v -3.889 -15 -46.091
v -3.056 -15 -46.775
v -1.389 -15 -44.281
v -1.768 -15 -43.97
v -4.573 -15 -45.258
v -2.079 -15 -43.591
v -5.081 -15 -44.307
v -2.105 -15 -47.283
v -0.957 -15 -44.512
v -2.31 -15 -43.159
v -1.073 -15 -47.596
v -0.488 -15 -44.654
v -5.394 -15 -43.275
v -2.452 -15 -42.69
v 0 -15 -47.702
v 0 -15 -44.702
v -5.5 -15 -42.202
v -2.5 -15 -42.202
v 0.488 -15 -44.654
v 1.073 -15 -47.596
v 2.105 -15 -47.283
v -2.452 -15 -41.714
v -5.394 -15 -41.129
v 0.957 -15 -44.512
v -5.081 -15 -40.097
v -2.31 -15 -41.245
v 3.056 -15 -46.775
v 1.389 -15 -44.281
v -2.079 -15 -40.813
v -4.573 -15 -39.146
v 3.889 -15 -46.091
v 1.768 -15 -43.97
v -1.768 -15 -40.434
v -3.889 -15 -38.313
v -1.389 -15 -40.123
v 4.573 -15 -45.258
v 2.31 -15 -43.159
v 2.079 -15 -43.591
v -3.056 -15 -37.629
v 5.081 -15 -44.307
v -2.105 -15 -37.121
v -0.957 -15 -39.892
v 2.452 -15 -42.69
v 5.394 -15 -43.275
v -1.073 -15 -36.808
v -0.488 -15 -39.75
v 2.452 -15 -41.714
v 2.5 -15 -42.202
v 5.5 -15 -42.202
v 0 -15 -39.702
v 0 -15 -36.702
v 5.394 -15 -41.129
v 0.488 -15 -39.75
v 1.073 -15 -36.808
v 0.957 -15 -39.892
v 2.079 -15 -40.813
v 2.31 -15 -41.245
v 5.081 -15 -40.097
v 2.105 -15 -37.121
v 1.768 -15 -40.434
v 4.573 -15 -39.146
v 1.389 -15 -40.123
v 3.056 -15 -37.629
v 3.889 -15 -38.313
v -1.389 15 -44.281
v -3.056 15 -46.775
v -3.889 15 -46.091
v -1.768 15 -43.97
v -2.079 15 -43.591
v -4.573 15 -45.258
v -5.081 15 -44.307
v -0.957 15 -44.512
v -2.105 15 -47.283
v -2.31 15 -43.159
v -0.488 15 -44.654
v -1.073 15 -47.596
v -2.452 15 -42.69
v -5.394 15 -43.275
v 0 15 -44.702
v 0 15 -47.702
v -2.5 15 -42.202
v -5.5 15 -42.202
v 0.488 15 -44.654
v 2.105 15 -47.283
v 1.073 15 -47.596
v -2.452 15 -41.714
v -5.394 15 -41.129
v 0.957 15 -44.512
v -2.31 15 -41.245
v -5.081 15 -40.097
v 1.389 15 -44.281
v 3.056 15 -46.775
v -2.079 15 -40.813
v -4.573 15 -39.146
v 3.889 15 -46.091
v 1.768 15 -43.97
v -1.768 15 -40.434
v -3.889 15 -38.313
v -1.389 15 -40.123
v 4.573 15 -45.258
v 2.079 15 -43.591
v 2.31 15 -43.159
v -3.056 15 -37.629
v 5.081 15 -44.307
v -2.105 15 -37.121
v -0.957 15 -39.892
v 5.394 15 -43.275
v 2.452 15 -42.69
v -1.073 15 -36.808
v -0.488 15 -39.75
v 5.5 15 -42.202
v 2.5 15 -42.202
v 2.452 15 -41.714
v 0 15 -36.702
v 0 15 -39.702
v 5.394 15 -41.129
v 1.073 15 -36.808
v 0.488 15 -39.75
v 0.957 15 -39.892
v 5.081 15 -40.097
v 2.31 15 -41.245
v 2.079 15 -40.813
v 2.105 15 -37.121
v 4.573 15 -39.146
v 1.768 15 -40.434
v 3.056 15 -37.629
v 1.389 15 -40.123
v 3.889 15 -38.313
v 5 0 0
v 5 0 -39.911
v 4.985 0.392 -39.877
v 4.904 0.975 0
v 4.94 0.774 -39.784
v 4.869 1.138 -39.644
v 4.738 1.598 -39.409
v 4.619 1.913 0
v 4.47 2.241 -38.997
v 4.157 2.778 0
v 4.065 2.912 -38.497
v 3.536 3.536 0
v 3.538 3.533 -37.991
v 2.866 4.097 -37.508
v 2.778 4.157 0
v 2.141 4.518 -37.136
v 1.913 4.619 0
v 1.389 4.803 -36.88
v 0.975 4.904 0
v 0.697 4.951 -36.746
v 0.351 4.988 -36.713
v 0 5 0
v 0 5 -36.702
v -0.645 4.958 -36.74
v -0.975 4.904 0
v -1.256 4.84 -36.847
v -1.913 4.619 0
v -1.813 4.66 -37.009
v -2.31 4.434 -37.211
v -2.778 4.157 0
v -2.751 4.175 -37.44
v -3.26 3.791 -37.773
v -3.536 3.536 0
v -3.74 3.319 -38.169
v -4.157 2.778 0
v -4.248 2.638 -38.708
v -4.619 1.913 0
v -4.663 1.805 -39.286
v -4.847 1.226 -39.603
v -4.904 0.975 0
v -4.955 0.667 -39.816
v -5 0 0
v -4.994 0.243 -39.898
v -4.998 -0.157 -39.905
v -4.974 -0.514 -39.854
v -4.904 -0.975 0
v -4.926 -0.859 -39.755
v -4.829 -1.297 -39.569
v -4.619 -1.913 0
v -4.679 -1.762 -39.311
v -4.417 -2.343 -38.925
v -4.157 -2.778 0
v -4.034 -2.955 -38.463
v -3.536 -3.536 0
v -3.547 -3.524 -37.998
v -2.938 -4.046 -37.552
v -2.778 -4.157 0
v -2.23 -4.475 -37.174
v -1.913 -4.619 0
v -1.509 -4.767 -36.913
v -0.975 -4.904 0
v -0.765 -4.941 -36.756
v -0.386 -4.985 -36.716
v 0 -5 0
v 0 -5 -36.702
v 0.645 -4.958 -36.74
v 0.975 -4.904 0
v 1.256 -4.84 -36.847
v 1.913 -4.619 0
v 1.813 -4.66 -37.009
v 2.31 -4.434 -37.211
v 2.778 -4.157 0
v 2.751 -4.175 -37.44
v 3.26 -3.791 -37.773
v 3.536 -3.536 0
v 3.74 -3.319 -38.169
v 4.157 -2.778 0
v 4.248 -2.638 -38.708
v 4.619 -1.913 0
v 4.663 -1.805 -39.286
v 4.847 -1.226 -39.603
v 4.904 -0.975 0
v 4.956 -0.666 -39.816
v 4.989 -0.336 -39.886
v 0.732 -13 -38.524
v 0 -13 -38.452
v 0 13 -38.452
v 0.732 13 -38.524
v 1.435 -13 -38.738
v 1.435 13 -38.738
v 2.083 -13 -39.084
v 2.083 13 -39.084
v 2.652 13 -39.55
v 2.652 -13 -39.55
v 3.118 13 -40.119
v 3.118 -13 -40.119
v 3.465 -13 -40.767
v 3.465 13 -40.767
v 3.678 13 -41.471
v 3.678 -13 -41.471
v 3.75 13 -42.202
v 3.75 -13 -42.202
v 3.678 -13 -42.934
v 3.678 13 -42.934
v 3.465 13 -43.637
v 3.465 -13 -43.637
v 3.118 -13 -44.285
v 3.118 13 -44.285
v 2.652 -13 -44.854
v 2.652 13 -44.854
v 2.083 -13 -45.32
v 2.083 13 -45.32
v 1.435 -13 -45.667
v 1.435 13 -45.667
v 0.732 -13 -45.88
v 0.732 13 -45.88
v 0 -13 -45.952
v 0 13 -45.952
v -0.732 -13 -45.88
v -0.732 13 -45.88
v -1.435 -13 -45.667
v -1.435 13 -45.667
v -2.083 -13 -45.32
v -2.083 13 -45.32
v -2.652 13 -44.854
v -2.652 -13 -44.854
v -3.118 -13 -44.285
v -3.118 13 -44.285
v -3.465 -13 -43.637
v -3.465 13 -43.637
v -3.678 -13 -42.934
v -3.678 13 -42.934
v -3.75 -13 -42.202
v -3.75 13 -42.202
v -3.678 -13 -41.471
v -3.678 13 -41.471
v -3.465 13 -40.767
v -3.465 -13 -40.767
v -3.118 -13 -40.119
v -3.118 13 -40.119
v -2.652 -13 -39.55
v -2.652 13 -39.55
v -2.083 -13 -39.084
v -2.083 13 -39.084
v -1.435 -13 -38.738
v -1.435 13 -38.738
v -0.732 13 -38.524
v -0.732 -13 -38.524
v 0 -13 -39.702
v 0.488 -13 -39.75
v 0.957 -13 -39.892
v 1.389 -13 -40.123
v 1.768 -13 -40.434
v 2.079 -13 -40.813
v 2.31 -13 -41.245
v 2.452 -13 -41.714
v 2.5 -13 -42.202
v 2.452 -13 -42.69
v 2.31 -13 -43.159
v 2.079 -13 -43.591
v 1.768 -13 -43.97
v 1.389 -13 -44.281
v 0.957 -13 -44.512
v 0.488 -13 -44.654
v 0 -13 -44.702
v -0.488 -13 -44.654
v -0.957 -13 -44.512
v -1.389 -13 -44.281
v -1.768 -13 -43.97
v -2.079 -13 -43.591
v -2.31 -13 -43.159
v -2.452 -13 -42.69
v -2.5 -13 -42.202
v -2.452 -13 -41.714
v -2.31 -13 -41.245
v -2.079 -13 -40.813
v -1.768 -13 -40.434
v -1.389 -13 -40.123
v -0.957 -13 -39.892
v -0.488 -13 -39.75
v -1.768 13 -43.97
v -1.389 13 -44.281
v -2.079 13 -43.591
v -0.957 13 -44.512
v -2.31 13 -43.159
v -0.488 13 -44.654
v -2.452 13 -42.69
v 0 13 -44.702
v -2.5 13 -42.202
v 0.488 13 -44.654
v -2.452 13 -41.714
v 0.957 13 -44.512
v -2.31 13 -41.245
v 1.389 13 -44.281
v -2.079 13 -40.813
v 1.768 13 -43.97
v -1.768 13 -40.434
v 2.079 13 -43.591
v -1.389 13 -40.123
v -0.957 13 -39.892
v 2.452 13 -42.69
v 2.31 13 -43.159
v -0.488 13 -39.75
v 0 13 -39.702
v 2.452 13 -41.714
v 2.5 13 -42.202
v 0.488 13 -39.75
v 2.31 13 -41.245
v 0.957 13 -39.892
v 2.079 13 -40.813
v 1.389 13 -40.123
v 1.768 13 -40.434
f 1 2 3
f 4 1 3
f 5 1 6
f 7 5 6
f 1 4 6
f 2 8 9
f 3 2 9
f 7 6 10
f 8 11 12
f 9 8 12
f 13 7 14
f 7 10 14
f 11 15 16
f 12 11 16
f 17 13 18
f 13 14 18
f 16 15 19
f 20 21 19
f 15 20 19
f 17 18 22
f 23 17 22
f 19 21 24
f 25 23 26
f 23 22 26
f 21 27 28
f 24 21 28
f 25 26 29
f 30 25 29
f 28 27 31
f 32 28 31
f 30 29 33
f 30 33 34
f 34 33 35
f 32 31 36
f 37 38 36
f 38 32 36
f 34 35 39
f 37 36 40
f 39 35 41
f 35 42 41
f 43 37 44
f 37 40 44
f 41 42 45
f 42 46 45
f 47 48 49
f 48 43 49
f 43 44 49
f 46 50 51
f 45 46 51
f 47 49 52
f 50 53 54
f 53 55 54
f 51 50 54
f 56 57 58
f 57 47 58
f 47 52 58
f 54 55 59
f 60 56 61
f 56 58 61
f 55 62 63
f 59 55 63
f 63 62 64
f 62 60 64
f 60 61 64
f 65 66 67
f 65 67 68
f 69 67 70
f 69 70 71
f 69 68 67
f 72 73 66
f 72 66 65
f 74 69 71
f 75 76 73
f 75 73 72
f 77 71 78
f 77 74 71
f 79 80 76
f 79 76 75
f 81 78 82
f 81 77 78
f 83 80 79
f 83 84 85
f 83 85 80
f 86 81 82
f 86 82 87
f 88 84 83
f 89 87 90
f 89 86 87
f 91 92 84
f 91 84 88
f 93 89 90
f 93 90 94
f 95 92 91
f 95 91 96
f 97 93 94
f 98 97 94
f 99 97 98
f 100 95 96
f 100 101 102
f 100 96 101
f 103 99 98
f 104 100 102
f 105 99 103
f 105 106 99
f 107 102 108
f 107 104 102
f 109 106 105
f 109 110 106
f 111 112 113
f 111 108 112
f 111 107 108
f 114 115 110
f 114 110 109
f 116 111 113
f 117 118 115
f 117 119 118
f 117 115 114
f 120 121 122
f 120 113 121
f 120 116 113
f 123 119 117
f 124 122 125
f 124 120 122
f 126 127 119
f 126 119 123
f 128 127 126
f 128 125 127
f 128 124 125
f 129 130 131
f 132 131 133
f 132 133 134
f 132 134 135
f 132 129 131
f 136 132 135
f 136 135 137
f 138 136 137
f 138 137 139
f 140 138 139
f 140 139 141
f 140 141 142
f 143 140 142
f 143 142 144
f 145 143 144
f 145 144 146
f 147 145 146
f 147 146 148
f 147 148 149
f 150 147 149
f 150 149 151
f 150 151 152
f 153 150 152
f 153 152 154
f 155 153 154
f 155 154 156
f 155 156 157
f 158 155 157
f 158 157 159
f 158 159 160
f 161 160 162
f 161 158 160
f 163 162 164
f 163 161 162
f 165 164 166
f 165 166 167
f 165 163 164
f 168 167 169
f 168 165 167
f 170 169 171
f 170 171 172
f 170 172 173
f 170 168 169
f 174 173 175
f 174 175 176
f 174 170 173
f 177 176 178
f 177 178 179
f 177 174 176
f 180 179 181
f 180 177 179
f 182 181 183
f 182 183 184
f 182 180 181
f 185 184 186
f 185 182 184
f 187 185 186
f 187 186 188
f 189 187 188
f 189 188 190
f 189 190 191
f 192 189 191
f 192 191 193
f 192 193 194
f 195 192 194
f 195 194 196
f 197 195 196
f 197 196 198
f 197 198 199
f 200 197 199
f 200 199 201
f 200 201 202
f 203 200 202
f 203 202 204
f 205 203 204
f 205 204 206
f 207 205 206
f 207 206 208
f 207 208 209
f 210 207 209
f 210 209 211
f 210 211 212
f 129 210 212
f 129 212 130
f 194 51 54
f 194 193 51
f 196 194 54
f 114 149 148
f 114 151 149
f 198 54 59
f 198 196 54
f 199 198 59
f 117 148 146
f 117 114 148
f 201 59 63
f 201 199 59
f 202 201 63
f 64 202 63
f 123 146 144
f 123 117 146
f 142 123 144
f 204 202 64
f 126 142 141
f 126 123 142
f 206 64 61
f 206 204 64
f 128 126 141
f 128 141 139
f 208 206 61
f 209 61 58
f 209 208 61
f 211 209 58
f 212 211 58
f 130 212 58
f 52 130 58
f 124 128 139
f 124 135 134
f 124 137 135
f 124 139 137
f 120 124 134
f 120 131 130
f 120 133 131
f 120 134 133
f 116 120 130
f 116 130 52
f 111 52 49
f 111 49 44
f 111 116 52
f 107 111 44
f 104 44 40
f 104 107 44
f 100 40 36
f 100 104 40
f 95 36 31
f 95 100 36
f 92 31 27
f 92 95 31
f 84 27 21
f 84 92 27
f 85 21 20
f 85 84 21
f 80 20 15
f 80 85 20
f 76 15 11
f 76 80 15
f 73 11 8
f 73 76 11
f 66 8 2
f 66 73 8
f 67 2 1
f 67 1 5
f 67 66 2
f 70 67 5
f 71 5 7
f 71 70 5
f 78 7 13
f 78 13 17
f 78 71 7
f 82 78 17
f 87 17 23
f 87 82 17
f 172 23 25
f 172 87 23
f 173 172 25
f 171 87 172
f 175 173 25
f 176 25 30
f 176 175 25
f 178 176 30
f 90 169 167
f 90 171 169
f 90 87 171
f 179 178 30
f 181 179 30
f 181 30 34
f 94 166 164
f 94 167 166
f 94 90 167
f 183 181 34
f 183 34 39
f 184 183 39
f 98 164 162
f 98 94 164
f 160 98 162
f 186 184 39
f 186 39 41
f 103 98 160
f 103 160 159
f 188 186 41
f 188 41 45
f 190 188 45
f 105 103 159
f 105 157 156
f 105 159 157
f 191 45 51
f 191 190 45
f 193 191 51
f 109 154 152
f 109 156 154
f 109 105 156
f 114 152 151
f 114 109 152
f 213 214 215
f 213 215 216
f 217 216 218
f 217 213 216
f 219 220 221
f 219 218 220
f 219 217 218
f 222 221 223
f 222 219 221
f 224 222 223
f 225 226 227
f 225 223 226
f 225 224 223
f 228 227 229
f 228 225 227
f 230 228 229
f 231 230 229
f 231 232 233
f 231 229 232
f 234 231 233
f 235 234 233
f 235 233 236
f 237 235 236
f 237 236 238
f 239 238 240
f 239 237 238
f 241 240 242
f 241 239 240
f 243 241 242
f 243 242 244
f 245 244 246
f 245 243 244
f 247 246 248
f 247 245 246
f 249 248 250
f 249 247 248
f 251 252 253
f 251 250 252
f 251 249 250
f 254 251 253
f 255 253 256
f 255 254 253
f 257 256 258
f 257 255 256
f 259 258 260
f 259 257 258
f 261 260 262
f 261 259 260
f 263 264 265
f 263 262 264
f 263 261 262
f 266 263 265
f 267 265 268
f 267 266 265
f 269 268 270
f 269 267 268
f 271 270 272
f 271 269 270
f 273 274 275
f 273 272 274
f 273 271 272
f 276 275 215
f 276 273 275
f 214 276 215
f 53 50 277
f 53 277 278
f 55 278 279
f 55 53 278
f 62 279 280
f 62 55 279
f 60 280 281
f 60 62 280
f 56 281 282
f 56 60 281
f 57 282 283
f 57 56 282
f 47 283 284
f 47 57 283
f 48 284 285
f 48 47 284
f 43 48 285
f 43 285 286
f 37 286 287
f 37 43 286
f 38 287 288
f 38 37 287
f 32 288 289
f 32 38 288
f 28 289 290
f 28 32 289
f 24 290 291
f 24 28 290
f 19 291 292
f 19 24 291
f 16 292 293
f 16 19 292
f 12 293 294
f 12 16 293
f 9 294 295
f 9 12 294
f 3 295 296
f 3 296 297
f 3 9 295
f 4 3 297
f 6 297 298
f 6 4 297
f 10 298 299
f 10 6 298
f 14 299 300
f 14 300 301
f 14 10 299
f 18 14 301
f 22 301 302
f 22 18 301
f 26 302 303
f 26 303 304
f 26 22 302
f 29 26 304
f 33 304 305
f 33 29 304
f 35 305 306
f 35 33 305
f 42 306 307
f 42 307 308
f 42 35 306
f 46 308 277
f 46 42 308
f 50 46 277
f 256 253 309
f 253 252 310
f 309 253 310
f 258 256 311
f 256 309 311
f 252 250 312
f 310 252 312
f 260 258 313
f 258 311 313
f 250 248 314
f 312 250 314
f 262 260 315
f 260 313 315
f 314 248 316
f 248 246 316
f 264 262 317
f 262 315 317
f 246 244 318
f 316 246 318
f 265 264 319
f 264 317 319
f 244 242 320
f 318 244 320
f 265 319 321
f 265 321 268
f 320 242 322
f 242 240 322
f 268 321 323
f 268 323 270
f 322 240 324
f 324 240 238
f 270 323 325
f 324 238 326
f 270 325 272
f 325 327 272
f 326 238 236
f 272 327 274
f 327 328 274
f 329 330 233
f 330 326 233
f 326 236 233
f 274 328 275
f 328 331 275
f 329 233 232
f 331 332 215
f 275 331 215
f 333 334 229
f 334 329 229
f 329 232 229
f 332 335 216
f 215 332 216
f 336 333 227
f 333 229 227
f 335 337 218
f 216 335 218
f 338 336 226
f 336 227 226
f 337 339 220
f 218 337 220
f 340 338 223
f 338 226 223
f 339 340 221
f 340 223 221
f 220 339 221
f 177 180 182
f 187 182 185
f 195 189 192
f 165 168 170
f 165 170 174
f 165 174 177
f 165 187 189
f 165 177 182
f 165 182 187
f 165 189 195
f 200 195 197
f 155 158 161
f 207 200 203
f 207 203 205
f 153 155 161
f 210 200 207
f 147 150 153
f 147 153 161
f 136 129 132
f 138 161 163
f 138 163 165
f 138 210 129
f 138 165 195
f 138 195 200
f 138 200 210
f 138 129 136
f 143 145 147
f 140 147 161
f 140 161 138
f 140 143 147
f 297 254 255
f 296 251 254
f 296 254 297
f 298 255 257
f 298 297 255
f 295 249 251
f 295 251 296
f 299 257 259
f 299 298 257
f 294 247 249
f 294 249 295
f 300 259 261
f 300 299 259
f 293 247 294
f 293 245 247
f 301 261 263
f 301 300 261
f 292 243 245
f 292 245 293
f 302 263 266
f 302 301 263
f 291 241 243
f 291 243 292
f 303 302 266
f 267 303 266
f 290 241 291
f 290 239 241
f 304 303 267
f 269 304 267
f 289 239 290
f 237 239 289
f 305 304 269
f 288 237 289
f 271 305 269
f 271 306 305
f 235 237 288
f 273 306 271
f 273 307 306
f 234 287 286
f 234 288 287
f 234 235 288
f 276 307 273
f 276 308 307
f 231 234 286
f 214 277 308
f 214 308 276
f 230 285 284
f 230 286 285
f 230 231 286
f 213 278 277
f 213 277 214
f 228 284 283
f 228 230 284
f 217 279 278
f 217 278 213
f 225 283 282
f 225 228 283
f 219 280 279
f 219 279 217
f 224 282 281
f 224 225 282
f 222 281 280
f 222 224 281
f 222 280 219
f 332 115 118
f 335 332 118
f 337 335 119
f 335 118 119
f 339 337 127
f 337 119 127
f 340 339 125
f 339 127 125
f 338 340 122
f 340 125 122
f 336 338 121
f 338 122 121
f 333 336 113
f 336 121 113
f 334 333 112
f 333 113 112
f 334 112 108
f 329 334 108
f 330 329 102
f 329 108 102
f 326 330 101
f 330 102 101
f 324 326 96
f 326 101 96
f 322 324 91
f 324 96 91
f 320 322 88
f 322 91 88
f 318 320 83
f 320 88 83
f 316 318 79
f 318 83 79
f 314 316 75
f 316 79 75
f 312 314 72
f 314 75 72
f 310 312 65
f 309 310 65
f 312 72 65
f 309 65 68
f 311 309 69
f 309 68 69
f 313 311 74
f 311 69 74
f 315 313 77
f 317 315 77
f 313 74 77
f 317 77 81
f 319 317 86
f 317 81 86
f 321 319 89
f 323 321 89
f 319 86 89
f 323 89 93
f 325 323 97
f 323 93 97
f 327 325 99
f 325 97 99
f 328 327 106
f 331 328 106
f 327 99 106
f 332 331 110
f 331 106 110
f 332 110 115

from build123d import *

# Parameters (mm, degrees)
CROQUIS1_R              = 5
SALIENTE_EXTRUIR1_DEPTH = 40
CROQUIS2_R              = 5.5
CROQUIS2_R_2            = 3.75
SALIENTE_EXTRUIR2_DEPTH = 15
CORTAR_EXTRUIR1_START   = -30
CROQUIS3_R              = 3.75
CORTAR_EXTRUIR1_DEPTH   = 30
CROQUIS4_R              = 5.5
CROQUIS4_R_2            = 2.5
SALIENTE_EXTRUIR3_DEPTH = 2


with BuildPart() as part:
    # Croquis1 → Saliente-Extruir1 (new body)
    with BuildSketch(Plane.XY):
        Circle(CROQUIS1_R)
    extrude(amount=-SALIENTE_EXTRUIR1_DEPTH)

    # Croquis2 → Saliente-Extruir2 (add, symmetric)
    with BuildSketch(Plane(origin=(0, 0, 0), x_dir=(1, 0, 0), z_dir=(0, 1, 0))):
        with Locations(Location((0, 42.202107472, 0), (0, 0, 270))):
            Circle(CROQUIS2_R)
        with Locations(Location((0, 42.202107472, 0), (0, 0, 270))):
            Circle(CROQUIS2_R_2, mode=Mode.SUBTRACT)
    extrude(amount=SALIENTE_EXTRUIR2_DEPTH, both=True)

    # Croquis3 → Cortar-Extruir1 (cut)
    with BuildSketch(Plane(origin=(0, 15, 0), x_dir=(1, 0, 0), z_dir=(0, 1, 0)).offset(CORTAR_EXTRUIR1_START)):
        with Locations(Location((0, 42.202107472, 0), (0, 0, 270))):
            Circle(CROQUIS3_R)
    extrude(amount=CORTAR_EXTRUIR1_DEPTH, mode=Mode.SUBTRACT)

    # Croquis4 → Saliente-Extruir3 (add)
    with BuildSketch(Plane(origin=(0, 15, 0), x_dir=(1, 0, 0), z_dir=(0, 1, 0))):
        with Locations(Location((0, 42.202107472, 0), (0, 0, 270))):
            Circle(CROQUIS4_R)
        with Locations(Location((0, 42.202107472, 0), (0, 0, 270))):
            Circle(CROQUIS4_R_2, mode=Mode.SUBTRACT)
    saliente_extruir3 = extrude(amount=-SALIENTE_EXTRUIR3_DEPTH)

    # Simetría1: Saliente-Extruir3 across plane
    add(saliente_extruir3.mirror(Plane.ZX))


solid = part.part
